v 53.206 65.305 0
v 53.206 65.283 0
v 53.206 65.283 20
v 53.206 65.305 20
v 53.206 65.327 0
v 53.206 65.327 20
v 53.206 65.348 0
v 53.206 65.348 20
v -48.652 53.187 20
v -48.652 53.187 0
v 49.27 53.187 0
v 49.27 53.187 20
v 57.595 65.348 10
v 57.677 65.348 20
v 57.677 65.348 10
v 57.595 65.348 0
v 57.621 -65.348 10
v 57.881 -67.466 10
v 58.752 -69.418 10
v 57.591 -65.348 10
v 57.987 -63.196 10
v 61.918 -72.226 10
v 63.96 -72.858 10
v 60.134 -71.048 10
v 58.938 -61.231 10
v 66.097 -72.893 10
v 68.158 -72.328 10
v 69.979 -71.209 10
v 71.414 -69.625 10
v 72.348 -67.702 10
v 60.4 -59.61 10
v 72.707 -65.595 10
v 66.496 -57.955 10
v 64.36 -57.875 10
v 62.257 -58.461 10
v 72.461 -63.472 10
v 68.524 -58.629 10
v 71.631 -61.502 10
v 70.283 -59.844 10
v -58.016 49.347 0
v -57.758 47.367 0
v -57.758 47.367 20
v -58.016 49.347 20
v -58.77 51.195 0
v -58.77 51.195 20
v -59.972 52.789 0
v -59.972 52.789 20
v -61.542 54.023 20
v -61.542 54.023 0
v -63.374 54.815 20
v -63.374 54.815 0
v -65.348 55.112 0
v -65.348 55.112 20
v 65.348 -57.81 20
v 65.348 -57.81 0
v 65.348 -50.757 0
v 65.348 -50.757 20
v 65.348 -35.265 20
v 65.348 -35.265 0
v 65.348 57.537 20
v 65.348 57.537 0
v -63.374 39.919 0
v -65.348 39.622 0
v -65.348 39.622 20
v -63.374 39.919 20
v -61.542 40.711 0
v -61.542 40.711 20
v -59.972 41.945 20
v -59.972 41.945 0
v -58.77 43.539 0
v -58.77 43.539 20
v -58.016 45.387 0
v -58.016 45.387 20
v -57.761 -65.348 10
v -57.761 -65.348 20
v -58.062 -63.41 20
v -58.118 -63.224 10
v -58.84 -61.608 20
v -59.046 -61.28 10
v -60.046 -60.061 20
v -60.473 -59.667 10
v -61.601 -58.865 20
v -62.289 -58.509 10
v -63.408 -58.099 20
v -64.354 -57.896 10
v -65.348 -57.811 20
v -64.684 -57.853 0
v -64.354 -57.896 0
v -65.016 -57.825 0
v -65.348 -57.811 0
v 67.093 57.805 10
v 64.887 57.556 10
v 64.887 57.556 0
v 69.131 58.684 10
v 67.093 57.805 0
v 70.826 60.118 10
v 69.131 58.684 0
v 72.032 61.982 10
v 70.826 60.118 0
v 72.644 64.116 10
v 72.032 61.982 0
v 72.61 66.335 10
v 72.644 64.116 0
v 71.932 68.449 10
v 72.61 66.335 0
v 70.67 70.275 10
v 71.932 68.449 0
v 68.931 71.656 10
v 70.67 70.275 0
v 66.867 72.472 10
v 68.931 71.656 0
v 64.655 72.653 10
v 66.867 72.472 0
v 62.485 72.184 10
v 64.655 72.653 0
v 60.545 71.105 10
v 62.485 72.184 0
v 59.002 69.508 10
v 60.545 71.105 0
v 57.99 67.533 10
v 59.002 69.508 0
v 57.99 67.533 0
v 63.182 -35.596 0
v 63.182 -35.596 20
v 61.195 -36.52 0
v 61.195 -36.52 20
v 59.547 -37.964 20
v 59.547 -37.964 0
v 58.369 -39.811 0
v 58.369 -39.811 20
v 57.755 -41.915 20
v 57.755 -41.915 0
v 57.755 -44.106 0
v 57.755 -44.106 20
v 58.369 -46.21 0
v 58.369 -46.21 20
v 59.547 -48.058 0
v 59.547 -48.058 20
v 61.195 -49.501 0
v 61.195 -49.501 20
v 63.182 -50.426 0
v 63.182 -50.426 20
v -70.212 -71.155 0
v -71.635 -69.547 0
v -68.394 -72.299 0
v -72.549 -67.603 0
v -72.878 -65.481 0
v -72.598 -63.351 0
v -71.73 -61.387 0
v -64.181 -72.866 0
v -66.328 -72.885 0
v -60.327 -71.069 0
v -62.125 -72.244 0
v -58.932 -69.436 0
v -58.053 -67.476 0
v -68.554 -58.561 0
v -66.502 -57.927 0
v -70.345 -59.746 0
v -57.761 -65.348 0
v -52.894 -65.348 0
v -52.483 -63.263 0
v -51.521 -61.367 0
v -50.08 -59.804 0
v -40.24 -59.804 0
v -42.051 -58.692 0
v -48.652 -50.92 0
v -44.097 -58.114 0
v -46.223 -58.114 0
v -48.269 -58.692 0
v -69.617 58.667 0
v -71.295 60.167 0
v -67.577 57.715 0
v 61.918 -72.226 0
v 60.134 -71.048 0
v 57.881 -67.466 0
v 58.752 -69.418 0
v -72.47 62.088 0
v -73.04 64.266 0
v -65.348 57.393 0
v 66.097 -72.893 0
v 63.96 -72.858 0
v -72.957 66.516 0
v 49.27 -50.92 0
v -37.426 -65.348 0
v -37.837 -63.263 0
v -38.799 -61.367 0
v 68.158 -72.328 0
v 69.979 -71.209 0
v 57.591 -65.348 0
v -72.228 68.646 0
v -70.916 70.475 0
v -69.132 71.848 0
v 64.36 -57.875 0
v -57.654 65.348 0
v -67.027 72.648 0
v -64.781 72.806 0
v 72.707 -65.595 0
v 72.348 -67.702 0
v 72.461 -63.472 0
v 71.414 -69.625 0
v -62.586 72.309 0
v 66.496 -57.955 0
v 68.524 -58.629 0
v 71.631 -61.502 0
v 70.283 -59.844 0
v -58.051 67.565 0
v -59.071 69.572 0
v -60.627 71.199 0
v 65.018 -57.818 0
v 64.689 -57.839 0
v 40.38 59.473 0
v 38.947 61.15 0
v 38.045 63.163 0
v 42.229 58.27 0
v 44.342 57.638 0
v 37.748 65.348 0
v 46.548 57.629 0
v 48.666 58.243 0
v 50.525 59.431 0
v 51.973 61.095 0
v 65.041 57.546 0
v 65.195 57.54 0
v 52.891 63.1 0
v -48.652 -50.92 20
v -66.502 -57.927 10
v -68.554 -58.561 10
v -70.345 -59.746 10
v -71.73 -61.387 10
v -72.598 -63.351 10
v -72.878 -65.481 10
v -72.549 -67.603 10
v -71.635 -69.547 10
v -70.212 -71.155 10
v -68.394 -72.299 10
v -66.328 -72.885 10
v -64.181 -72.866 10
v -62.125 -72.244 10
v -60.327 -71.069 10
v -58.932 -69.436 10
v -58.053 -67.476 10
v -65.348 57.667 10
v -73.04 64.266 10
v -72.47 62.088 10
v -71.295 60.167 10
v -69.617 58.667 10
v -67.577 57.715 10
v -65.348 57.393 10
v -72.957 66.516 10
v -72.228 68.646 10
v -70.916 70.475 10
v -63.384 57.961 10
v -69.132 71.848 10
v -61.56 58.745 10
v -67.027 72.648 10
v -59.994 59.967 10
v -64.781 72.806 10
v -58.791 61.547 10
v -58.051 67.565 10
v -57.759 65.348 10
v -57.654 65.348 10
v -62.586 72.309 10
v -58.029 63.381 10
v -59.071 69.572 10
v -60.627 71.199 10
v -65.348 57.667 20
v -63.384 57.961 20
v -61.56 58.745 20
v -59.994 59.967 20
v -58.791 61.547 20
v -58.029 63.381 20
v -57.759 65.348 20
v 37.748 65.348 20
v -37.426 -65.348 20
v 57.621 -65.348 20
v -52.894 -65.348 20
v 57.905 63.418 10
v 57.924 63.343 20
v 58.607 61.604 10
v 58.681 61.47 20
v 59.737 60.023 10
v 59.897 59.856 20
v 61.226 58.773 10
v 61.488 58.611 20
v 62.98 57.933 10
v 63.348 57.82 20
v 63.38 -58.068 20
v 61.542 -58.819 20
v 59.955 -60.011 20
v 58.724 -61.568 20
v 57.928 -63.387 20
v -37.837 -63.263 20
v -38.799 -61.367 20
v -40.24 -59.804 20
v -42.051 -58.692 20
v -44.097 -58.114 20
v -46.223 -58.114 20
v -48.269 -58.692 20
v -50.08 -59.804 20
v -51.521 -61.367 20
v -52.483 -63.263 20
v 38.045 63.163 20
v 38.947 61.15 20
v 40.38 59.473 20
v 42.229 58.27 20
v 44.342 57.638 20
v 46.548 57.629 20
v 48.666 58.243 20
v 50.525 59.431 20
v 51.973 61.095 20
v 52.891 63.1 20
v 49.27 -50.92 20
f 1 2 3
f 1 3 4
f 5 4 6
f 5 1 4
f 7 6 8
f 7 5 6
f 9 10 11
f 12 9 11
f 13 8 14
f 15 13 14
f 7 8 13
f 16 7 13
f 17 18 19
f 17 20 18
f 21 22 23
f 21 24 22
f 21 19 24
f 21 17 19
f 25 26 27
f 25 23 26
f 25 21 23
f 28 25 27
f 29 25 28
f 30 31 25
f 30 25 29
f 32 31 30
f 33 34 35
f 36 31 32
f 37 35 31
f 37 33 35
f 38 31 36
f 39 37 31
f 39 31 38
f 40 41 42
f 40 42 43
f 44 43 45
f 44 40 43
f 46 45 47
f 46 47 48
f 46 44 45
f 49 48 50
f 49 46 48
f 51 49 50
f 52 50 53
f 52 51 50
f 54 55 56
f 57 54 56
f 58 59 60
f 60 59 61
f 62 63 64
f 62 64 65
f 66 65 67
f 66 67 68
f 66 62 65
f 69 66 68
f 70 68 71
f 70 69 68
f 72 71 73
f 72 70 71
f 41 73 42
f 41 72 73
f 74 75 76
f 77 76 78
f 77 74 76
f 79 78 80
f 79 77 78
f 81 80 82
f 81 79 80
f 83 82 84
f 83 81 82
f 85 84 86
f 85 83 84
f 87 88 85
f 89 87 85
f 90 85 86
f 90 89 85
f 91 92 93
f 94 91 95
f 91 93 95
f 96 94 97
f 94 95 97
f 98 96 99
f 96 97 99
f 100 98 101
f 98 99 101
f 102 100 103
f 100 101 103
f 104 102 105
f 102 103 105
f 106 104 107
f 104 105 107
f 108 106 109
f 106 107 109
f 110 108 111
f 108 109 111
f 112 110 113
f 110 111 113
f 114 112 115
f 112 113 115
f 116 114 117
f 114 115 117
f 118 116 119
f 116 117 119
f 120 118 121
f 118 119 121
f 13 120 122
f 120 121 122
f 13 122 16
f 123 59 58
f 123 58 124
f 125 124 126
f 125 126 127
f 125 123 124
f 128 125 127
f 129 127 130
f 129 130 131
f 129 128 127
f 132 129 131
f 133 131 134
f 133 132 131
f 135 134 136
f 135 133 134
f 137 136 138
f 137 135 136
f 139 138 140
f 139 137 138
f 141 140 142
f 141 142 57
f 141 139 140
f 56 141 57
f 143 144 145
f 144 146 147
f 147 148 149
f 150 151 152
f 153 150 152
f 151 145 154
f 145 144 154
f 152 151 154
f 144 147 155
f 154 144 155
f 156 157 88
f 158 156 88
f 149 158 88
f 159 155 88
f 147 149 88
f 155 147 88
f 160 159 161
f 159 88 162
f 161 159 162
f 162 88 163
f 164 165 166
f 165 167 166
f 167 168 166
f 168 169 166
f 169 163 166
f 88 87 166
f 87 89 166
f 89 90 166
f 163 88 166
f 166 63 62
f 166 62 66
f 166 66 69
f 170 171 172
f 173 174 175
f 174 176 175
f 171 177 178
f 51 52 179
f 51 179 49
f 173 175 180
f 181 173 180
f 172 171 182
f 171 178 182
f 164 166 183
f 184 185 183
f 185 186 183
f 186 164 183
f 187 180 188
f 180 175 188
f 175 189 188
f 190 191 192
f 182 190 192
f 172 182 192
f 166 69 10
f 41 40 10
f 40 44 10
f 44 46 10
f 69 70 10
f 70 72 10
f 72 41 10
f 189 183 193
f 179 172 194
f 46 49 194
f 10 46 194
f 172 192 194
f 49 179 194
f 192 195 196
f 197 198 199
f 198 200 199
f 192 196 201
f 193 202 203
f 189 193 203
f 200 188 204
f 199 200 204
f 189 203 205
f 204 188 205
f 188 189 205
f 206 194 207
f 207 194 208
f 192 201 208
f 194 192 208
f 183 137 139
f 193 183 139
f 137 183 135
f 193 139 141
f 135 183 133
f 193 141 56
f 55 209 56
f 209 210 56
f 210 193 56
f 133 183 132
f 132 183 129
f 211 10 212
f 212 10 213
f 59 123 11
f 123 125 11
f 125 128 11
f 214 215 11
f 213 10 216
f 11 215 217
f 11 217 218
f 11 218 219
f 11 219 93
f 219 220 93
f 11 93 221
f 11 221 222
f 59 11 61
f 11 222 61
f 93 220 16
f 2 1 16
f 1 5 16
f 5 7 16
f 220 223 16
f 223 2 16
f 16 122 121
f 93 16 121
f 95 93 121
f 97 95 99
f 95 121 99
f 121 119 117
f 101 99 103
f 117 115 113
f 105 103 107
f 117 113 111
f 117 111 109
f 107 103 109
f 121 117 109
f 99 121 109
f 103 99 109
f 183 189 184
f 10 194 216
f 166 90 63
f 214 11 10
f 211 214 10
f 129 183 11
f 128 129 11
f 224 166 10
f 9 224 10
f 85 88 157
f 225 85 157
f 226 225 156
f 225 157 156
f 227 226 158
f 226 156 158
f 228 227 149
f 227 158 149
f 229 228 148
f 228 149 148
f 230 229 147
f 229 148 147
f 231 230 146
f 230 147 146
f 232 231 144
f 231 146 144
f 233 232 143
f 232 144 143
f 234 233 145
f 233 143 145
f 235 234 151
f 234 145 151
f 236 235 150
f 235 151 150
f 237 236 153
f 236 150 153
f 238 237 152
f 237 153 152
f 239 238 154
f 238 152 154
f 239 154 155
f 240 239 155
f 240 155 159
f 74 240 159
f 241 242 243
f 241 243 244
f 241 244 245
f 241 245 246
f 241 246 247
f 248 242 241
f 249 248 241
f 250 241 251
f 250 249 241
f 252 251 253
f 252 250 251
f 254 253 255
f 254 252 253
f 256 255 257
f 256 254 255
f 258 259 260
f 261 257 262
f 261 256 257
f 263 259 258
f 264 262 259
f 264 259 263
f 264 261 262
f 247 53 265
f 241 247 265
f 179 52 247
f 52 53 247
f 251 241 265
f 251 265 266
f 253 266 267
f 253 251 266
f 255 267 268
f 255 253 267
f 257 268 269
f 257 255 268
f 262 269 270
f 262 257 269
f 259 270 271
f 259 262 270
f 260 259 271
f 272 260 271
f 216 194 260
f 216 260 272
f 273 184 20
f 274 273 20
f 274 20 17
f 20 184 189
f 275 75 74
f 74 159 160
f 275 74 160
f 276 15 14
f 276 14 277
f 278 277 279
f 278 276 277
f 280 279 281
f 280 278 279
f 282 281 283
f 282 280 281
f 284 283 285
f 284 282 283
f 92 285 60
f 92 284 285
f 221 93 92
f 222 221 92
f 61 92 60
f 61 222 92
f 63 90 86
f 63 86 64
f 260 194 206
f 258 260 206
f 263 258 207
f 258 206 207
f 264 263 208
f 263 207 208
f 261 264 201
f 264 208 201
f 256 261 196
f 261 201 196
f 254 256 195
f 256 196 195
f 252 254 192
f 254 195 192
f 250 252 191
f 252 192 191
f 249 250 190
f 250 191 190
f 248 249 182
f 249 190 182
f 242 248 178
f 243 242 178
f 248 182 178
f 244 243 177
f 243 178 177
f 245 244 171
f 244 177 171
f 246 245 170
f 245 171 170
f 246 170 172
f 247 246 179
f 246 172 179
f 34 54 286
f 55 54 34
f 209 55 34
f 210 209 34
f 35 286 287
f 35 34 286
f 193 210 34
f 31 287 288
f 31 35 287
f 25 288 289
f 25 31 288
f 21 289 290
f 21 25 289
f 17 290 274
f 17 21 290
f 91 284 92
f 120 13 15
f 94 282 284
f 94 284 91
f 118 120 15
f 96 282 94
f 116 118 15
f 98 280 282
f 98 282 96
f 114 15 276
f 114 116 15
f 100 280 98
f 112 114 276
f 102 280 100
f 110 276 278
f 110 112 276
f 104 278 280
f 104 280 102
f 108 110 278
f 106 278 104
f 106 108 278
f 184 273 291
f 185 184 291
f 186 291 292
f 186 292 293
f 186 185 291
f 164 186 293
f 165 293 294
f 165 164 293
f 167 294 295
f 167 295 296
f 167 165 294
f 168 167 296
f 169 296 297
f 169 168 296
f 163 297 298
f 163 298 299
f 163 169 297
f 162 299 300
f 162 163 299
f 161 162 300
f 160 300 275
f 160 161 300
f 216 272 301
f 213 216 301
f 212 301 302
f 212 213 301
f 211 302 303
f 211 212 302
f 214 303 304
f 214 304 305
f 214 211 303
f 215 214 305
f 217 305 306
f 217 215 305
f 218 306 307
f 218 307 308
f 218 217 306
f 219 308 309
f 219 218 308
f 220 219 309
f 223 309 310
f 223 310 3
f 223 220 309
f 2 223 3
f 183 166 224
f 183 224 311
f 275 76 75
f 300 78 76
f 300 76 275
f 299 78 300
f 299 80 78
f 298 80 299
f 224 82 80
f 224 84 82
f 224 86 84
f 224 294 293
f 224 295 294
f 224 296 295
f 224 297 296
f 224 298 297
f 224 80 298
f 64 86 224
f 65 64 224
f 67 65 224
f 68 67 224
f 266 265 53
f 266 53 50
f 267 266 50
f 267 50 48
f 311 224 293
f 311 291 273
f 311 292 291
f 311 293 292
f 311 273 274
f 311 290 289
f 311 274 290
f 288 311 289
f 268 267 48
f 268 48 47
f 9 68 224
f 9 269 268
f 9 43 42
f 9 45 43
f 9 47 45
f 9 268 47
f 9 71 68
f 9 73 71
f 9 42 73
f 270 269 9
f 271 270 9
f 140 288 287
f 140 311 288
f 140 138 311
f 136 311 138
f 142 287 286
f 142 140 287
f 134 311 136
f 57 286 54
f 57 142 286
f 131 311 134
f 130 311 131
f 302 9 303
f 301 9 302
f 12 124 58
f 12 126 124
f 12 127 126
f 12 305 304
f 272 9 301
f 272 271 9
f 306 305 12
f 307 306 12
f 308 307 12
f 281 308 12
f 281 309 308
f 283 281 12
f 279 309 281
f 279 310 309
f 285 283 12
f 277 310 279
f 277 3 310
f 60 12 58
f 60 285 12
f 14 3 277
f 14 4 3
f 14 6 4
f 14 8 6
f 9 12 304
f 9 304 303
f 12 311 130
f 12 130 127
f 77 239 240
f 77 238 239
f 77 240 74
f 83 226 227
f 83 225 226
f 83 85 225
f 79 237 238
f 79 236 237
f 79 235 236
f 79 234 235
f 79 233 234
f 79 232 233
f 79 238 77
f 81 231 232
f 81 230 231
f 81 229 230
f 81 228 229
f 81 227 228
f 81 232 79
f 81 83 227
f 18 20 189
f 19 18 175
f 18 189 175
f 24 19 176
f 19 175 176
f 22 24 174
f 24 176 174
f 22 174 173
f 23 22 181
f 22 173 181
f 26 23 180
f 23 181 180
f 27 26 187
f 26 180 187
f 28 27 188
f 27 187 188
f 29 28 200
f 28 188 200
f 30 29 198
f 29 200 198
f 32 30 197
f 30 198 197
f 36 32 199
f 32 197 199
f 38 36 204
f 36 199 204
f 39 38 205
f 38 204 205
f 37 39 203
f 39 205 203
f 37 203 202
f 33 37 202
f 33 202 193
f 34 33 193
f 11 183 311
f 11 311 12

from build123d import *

# Parameters (mm, degrees)
F0_W     = 130.696968
F0_H     = 130.696968
F1_DEPTH = 20
F3_DEPTH = 20
F4_W     = 97.922124
F4_H     = 104.10668
F5_DEPTH = 25
F6_R     = 7.559223
F6_R_2   = 7.71768
F7_DEPTH = 10


with BuildPart() as f1:
    # F0 (on Top) → F1 (new body)
    with BuildSketch(Plane.XY):
        Rectangle(F0_W, F0_H)
    extrude(amount=F1_DEPTH)

    # F2 (on Top) → F3 (cut)
    with BuildSketch(Plane.XY):
        with BuildLine():
            Line((65.463071, -65.384018), (65.463071, -73.302153))
            ThreePointArc((65.463071, -73.302153), (70.877053, -70.99904), (73.111326, -65.556288))
            ThreePointArc((73.111326, -65.556288), (65.450978, -57.810279), (57.620266, -65.384018))
            Line((57.620266, -65.384018), (65.463071, -65.384018))
        make_face()
        with BuildLine():
            ThreePointArc((65.266604, -73.302153), (65.364838, -73.302776), (65.463071, -73.302153))
            Line((65.463071, -73.302153), (65.266604, -73.302153))
        make_face()
        with BuildLine():
            Line((-43.278281, -73.302153), (65.266604, -73.302153))
            ThreePointArc((65.266604, -73.302153), (59.79244, -70.937409), (57.620266, -65.384018))
            Line((57.620266, -65.384018), (-37.424044, -65.384018))
            ThreePointArc((-37.424044, -65.384018), (-37.416151, -65.585784), (-37.413519, -65.787688))
            ThreePointArc((-37.413519, -65.787688), (-39.053255, -70.553782), (-43.278281, -73.302153))
        make_face()
        with BuildLine():
            ThreePointArc((-47.041733, -73.302153), (-45.160007, -73.534176), (-43.278281, -73.302153))
            Line((-43.278281, -73.302153), (-47.041733, -73.302153))
        make_face()
        with BuildLine():
            Line((-52.89597, -65.384018), (-37.424044, -65.384018))
            ThreePointArc((-37.424044, -65.384018), (-45.160007, -58.0412), (-52.89597, -65.384018))
        make_face()
        with BuildLine():
            Line((-52.89597, -73.302153), (-47.041733, -73.302153))
            ThreePointArc((-47.041733, -73.302153), (-51.140461, -70.711329), (-52.89597, -66.191358))
            Line((-52.89597, -66.191358), (-52.89597, -73.302153))
        make_face()
        with BuildLine():
            Line((-52.89597, -66.191358), (-52.89597, -65.384018))
            ThreePointArc((-52.89597, -65.384018), (-52.906495, -65.787688), (-52.89597, -66.191358))
        make_face()
        with BuildLine():
            ThreePointArc((-73.248961, -65.359679), (-65.60328, -73.302152), (-57.75848, -65.556288))
            ThreePointArc((-57.75848, -65.556288), (-60.027374, -60.078694), (-65.504968, -57.8098))
            Line((-65.504968, -57.8098), (-65.504968, -65.365049))
            Line((-65.504968, -65.365049), (-73.248961, -65.365049))
            Line((-73.248961, -65.365049), (-73.248961, -65.359679))
        make_face()
        with BuildLine():
            ThreePointArc((-73.248961, -65.359679), (-70.912604, -60.009617), (-65.504968, -57.8098))
            Line((-65.504968, -57.8098), (-65.504968, 39.620381))
            ThreePointArc((-65.504968, 39.620381), (-70.912604, 41.820198), (-73.248961, 47.17026))
            Line((-73.248961, 47.17026), (-73.248961, -65.359679))
        make_face()
        with BuildLine():
            Line((-65.504968, 54.955278), (-65.504968, 39.620381))
            ThreePointArc((-65.504968, 39.620381), (-60.027374, 41.889275), (-57.75848, 47.366869))
            ThreePointArc((-57.75848, 47.366869), (-60.608689, 53.369745), (-67.061929, 54.955278))
            Line((-67.061929, 54.955278), (-65.504968, 54.955278))
        make_face()
        with BuildLine():
            ThreePointArc((-73.248961, 47.563477), (-73.251456, 47.366869), (-73.248961, 47.17026))
            Line((-73.248961, 47.17026), (-73.248961, 47.563477))
        make_face()
        with BuildLine():
            Line((-73.248961, 54.955278), (-73.248961, 47.563477))
            ThreePointArc((-73.248961, 47.563477), (-71.445222, 52.338937), (-67.061929, 54.955278))
            Line((-67.061929, 54.955278), (-73.248961, 54.955278))
        make_face()
        with BuildLine():
            ThreePointArc((-64.895208, 73.134162), (-71.194062, 60.154116), (-57.75848, 65.411709))
            Line((-57.75848, 65.411709), (-65.504968, 65.411709))
            Line((-65.504968, 65.411709), (-65.504968, 73.134162))
            Line((-65.504968, 73.134162), (-64.895208, 73.134162))
        make_face()
        with BuildLine():
            ThreePointArc((-64.895208, 73.134162), (-59.815874, 70.669303), (-57.75848, 65.411709))
            Line((-57.75848, 65.411709), (37.749253, 65.411709))
            ThreePointArc((37.749253, 65.411709), (45.477167, 73.012411), (53.20508, 65.411709))
            Line((53.20508, 65.411709), (53.20508, 73.134162))
            Line((53.20508, 73.134162), (-64.895208, 73.134162))
        make_face()
        with BuildLine():
            Line((53.20508, 65.411709), (37.749253, 65.411709))
            ThreePointArc((37.749253, 65.411709), (45.413026, 57.554721), (53.206145, 65.283433))
            ThreePointArc((53.206145, 65.283433), (53.205879, 65.347573), (53.20508, 65.411709))
        make_face()
        with BuildLine():
            Line((73.154315, 65.283433), (73.170148, 65.283433))
            ThreePointArc((73.170148, 65.283433), (59.946066, 70.761027), (65.42366, 57.536945))
            Line((65.42366, 57.536945), (65.42366, 65.283433))
            Line((65.42366, 65.283433), (73.154315, 65.283433))
        make_face()
        with BuildLine():
            Line((73.265217, 65.283433), (73.170148, 65.283433))
            ThreePointArc((73.170148, 65.283433), (70.901254, 59.805838), (65.42366, 57.536945))
            Line((65.42366, 57.536945), (65.42366, -35.264168))
            ThreePointArc((65.42366, -35.264168), (70.901254, -37.533062), (73.170148, -43.010656))
            ThreePointArc((73.170148, -43.010656), (71.089749, -48.293033), (65.965977, -50.738137))
            Line((65.965977, -50.738137), (73.265217, -50.738137))
            Line((73.265217, -50.738137), (73.265217, 65.283433))
        make_face()
        with BuildLine():
            Line((65.42366, -50.738137), (65.42366, -35.264168))
            ThreePointArc((65.42366, -35.264168), (57.681925, -43.281981), (65.965977, -50.738137))
            Line((65.965977, -50.738137), (65.42366, -50.738137))
        make_face()
    extrude(amount=F3_DEPTH, mode=Mode.SUBTRACT)

    # F4 (on Top) → F5 (cut)
    with BuildSketch(Plane.XY):
        with Locations((0.309229, 1.133837)):
            Rectangle(F4_W, F4_H)
    extrude(amount=F5_DEPTH, mode=Mode.SUBTRACT)

    # F6 (on Top) → F7 (join)
    with BuildSketch(Plane.XY):
        with Locations((-65.319784, -65.393053)):
            Circle(F6_R)
        with Locations((65.150194, -65.393053)):
            Circle(F6_R)
        with Locations((-65.368432, 65.110195)):
            Circle(F6_R_2)
        with Locations((65.150194, 65.110195)):
            Circle(F6_R)
    extrude(amount=F7_DEPTH)


solid = f1.part
